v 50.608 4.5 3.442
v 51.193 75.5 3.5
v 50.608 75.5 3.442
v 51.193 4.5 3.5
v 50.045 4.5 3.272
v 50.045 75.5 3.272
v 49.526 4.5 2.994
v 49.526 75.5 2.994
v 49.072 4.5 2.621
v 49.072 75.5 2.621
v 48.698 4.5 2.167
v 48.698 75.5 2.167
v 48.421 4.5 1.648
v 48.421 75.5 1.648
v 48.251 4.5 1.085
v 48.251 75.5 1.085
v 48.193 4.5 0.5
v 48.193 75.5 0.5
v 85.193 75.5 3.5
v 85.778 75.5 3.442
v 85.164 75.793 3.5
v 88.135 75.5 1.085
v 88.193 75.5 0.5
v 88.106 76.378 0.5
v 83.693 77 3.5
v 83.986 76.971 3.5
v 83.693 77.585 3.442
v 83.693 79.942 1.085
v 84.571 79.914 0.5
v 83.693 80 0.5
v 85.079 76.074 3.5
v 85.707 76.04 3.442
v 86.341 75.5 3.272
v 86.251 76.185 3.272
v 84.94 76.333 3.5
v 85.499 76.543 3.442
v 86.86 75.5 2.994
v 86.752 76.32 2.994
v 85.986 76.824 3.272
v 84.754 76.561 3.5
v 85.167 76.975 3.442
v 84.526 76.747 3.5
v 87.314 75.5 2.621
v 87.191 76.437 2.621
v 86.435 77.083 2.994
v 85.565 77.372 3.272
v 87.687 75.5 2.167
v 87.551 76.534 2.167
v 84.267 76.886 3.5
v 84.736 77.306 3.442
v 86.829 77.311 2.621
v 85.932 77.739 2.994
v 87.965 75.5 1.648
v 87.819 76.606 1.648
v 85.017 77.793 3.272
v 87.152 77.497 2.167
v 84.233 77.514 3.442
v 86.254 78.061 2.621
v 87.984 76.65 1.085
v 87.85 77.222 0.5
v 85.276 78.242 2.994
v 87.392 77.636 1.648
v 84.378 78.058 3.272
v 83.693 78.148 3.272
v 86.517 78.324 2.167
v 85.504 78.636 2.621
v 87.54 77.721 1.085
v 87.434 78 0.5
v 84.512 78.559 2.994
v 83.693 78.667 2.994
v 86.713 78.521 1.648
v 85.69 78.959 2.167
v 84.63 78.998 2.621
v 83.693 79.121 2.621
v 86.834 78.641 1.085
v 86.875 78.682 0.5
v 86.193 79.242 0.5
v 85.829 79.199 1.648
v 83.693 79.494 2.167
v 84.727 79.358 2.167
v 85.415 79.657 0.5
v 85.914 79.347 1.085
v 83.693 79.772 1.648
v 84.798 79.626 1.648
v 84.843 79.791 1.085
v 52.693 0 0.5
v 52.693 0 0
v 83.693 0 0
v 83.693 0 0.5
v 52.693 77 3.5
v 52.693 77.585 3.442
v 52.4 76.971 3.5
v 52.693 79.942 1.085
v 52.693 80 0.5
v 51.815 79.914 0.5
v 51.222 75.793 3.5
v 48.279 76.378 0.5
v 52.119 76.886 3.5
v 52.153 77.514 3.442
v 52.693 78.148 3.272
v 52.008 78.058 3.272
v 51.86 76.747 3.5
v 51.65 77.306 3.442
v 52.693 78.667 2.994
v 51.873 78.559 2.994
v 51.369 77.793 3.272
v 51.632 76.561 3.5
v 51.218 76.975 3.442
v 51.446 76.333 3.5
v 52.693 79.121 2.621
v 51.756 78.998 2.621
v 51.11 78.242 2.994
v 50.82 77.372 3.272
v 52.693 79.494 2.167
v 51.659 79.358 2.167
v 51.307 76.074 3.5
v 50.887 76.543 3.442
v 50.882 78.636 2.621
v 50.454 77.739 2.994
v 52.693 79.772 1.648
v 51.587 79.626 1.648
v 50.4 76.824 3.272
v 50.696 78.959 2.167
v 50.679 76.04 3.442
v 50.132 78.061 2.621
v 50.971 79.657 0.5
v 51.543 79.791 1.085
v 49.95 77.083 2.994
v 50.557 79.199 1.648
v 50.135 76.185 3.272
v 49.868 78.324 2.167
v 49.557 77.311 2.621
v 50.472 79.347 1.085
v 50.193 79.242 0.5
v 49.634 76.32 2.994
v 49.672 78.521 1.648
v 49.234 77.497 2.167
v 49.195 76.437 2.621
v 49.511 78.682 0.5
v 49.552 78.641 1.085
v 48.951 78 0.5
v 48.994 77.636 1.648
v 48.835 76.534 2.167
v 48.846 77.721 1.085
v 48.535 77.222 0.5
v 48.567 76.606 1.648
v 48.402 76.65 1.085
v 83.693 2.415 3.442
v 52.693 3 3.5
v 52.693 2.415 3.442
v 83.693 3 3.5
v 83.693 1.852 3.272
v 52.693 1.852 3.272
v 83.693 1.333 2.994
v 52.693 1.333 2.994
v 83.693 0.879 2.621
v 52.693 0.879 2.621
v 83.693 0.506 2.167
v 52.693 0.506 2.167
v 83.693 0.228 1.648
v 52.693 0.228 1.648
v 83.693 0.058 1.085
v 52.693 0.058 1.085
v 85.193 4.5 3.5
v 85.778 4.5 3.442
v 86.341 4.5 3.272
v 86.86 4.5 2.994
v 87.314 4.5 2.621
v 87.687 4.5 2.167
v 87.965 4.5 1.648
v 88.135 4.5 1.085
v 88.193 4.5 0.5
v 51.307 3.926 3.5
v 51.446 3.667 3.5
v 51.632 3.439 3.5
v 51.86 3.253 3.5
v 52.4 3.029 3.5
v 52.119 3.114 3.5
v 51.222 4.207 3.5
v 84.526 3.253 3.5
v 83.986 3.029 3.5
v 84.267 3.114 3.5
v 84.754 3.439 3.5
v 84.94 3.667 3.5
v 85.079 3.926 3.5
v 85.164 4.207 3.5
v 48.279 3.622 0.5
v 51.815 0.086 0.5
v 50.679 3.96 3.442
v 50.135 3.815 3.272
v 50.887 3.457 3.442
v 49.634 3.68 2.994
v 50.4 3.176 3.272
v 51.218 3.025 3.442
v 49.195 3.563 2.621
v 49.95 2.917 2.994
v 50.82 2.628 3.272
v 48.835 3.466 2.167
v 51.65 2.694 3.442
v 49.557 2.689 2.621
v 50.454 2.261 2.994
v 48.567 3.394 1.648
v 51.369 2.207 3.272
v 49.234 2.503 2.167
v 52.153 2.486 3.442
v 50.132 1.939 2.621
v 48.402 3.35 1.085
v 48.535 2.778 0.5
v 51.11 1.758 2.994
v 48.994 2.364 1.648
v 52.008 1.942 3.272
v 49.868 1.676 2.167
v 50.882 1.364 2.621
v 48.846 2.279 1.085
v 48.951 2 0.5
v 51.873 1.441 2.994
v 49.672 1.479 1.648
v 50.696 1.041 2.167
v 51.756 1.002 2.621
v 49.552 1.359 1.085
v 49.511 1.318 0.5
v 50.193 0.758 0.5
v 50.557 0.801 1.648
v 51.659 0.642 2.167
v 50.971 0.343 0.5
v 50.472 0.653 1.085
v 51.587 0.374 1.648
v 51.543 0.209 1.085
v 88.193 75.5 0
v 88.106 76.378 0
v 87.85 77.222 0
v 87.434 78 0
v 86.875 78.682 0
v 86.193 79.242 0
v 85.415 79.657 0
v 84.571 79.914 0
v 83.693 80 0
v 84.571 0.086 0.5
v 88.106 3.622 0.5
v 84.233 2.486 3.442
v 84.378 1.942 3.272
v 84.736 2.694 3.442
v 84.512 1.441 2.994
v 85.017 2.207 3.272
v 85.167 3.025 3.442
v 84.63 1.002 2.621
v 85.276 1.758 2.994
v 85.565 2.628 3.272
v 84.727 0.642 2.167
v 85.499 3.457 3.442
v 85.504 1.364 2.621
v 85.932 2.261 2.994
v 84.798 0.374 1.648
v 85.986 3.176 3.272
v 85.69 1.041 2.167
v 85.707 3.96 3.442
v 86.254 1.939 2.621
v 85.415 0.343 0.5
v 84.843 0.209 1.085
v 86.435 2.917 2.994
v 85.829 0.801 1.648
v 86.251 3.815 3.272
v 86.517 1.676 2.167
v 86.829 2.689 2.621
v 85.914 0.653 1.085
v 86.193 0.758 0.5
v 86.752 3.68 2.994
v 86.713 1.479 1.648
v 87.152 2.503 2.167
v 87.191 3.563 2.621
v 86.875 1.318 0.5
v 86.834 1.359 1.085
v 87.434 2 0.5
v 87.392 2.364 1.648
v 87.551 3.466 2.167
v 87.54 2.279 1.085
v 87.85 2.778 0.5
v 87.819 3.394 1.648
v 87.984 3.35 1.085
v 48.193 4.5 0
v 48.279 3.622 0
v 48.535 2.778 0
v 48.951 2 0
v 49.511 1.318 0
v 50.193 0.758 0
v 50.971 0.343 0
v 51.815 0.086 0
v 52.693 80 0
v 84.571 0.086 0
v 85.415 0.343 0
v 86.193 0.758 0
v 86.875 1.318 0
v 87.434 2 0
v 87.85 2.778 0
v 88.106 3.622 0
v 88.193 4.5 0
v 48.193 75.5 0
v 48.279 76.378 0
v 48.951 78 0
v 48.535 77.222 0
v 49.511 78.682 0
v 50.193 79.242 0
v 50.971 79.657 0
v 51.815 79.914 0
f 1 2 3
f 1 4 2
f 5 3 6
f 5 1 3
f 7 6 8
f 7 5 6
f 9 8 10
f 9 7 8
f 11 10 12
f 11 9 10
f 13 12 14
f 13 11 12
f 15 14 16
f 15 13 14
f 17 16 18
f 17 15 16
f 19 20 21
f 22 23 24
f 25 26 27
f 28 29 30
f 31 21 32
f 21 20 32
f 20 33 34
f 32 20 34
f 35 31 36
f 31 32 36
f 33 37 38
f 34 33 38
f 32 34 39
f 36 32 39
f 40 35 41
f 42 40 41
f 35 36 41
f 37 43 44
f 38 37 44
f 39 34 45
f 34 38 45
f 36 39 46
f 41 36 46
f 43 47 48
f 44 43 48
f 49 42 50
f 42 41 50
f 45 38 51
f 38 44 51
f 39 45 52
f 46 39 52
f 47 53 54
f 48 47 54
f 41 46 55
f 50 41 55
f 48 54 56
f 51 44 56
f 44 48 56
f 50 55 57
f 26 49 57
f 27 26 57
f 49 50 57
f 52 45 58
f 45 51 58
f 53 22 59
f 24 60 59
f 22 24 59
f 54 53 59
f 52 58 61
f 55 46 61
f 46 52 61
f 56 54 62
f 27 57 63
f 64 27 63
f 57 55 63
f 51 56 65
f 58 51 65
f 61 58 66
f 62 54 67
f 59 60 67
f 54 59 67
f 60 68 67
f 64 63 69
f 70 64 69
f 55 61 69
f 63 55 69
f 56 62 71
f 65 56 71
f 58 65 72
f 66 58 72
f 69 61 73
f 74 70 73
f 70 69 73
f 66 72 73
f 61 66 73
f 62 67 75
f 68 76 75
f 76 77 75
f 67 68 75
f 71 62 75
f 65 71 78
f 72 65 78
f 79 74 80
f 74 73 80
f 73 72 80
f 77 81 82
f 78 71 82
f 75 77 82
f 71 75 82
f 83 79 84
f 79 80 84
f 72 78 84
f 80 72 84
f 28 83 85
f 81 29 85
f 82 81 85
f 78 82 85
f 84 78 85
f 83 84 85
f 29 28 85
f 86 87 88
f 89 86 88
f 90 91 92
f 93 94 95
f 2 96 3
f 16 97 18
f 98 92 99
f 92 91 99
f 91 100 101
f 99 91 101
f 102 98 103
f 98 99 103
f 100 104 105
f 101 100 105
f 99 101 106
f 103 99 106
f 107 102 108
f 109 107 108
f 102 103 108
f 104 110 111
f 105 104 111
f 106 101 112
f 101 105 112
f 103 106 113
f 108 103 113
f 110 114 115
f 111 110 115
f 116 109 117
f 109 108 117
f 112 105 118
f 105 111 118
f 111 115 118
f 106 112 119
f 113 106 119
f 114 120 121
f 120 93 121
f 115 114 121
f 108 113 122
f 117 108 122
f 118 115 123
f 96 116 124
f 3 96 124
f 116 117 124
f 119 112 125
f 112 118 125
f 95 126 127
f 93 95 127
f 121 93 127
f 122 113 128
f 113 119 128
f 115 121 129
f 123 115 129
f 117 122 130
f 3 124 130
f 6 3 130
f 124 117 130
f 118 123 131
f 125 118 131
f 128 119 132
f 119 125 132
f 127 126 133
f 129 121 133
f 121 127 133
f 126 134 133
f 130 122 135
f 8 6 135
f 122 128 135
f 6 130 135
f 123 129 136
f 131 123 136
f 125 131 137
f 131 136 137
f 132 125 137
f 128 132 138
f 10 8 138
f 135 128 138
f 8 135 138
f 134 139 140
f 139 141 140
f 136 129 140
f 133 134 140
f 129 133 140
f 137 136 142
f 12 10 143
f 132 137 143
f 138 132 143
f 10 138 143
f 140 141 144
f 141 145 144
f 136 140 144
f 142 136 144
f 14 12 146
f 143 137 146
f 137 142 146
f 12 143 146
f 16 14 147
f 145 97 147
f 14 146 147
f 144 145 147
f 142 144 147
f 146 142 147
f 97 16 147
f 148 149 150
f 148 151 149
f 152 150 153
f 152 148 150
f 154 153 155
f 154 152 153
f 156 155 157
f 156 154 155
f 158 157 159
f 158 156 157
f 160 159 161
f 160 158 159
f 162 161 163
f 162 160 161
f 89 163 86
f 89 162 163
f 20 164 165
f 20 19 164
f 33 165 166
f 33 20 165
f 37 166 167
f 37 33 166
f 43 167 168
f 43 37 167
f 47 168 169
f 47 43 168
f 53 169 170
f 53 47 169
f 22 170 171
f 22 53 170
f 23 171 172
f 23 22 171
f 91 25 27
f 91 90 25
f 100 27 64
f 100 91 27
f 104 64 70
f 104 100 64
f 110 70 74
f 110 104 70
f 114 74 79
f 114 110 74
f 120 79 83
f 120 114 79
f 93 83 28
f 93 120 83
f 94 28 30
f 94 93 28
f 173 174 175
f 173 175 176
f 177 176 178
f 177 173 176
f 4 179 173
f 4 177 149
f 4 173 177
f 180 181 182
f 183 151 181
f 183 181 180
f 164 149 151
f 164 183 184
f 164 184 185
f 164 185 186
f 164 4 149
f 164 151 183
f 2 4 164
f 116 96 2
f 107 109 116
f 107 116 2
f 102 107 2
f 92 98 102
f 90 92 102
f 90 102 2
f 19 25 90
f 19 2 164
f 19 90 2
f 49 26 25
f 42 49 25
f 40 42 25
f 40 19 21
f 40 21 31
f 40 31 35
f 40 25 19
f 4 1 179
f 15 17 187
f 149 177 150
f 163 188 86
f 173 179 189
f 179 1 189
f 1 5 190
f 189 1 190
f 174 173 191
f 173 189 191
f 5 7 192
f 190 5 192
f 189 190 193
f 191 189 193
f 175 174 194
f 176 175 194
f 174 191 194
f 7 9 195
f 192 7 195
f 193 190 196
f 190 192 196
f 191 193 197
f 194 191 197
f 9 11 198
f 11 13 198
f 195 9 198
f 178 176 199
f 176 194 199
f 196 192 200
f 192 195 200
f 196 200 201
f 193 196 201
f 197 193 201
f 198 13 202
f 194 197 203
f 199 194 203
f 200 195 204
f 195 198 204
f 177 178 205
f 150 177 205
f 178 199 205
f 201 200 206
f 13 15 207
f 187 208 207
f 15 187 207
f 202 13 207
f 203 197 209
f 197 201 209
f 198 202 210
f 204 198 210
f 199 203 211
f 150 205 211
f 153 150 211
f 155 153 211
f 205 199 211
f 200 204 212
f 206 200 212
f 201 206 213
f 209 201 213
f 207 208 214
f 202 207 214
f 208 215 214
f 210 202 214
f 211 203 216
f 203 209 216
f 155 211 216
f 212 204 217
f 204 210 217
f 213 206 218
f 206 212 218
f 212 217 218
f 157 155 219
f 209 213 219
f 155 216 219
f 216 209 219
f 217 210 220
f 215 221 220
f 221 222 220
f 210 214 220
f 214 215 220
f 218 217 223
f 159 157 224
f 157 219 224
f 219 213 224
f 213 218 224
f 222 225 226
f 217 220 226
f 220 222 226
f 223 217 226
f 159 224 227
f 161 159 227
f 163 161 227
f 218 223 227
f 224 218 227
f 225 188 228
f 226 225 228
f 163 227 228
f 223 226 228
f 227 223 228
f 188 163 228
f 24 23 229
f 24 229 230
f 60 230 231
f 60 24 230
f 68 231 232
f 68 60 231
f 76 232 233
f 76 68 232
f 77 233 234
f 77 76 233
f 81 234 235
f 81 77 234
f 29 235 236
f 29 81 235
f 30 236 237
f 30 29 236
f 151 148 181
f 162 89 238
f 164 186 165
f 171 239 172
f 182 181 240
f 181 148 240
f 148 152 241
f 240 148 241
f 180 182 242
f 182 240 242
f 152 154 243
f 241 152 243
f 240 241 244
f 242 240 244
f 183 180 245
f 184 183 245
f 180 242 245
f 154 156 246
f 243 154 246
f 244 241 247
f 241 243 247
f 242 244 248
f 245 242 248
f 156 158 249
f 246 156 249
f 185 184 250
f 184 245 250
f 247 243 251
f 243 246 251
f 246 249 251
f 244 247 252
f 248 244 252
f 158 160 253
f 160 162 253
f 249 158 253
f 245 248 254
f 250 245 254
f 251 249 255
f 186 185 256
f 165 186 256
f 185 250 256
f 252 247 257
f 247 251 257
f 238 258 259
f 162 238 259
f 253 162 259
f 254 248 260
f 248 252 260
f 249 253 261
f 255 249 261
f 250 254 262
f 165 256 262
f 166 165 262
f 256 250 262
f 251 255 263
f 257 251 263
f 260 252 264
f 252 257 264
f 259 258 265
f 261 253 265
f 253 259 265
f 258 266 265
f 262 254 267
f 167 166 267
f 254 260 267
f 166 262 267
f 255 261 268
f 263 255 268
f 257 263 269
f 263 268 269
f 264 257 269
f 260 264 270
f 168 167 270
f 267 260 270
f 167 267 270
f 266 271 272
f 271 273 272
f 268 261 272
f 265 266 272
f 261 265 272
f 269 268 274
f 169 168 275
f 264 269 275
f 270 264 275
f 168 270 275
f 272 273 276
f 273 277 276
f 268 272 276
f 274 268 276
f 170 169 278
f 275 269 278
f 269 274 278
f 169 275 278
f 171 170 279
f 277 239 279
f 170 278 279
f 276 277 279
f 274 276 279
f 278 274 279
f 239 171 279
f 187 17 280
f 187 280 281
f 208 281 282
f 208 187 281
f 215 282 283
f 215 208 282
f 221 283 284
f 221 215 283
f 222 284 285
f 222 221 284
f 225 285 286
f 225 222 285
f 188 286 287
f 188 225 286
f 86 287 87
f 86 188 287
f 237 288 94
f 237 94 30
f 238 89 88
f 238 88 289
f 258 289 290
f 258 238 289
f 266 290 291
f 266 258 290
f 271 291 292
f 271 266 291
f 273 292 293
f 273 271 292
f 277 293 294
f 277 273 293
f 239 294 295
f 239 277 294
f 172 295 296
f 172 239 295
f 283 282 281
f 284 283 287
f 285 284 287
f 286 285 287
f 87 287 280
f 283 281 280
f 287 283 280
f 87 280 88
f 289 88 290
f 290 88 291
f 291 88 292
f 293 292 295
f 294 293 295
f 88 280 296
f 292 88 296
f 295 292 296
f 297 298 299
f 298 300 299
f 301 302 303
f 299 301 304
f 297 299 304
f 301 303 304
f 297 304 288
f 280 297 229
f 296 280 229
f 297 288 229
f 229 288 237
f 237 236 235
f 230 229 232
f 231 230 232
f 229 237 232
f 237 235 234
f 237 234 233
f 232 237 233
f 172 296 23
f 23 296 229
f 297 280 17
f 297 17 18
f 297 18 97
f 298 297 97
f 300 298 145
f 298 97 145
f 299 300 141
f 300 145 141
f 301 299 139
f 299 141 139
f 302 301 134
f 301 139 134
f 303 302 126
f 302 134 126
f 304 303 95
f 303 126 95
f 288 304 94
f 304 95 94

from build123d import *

# Parameters (mm, degrees)
SKETCH_1_W      = 40
SKETCH_1_H      = 80
EXTRUDE_1_DEPTH = 3.5
FILLET_1_R      = 4.5
FILLET_2_R      = 3


with BuildPart() as part:
    # 草图1 → 凸台-拉伸1 (new body)
    with BuildSketch(Plane.XY):
        with Locations((68.192883988, 40)):
            Rectangle(SKETCH_1_W, SKETCH_1_H)
    extrude(amount=EXTRUDE_1_DEPTH)

    # 圆角1
    fillet_1_edges = [part.edges().sort_by_distance(p)[0] for p in [
        (48.192883988, 0, 1.75),
        (48.192883988, 80, 1.75),
        (88.192883988, 80, 1.75),
        (88.192883988, 0, 1.75),
    ]]
    fillet(fillet_1_edges, radius=FILLET_1_R)

    # 圆角2
    fillet_2_edges = [part.edges().sort_by_distance(p)[0] for p in [
        (68.192883988, 0, 3.5),
        (48.192883988, 40, 3.5),
        (88.192883988, 40, 3.5),
        (68.192883988, 80, 3.5),
        (86.874864503, 78.681980515, 3.5),
        (49.510903472, 78.681980515, 3.5),
        (86.874864503, 1.318019485, 3.5),
        (49.510903472, 1.318019485, 3.5),
    ]]
    fillet(fillet_2_edges, radius=FILLET_2_R)


solid = part.part
